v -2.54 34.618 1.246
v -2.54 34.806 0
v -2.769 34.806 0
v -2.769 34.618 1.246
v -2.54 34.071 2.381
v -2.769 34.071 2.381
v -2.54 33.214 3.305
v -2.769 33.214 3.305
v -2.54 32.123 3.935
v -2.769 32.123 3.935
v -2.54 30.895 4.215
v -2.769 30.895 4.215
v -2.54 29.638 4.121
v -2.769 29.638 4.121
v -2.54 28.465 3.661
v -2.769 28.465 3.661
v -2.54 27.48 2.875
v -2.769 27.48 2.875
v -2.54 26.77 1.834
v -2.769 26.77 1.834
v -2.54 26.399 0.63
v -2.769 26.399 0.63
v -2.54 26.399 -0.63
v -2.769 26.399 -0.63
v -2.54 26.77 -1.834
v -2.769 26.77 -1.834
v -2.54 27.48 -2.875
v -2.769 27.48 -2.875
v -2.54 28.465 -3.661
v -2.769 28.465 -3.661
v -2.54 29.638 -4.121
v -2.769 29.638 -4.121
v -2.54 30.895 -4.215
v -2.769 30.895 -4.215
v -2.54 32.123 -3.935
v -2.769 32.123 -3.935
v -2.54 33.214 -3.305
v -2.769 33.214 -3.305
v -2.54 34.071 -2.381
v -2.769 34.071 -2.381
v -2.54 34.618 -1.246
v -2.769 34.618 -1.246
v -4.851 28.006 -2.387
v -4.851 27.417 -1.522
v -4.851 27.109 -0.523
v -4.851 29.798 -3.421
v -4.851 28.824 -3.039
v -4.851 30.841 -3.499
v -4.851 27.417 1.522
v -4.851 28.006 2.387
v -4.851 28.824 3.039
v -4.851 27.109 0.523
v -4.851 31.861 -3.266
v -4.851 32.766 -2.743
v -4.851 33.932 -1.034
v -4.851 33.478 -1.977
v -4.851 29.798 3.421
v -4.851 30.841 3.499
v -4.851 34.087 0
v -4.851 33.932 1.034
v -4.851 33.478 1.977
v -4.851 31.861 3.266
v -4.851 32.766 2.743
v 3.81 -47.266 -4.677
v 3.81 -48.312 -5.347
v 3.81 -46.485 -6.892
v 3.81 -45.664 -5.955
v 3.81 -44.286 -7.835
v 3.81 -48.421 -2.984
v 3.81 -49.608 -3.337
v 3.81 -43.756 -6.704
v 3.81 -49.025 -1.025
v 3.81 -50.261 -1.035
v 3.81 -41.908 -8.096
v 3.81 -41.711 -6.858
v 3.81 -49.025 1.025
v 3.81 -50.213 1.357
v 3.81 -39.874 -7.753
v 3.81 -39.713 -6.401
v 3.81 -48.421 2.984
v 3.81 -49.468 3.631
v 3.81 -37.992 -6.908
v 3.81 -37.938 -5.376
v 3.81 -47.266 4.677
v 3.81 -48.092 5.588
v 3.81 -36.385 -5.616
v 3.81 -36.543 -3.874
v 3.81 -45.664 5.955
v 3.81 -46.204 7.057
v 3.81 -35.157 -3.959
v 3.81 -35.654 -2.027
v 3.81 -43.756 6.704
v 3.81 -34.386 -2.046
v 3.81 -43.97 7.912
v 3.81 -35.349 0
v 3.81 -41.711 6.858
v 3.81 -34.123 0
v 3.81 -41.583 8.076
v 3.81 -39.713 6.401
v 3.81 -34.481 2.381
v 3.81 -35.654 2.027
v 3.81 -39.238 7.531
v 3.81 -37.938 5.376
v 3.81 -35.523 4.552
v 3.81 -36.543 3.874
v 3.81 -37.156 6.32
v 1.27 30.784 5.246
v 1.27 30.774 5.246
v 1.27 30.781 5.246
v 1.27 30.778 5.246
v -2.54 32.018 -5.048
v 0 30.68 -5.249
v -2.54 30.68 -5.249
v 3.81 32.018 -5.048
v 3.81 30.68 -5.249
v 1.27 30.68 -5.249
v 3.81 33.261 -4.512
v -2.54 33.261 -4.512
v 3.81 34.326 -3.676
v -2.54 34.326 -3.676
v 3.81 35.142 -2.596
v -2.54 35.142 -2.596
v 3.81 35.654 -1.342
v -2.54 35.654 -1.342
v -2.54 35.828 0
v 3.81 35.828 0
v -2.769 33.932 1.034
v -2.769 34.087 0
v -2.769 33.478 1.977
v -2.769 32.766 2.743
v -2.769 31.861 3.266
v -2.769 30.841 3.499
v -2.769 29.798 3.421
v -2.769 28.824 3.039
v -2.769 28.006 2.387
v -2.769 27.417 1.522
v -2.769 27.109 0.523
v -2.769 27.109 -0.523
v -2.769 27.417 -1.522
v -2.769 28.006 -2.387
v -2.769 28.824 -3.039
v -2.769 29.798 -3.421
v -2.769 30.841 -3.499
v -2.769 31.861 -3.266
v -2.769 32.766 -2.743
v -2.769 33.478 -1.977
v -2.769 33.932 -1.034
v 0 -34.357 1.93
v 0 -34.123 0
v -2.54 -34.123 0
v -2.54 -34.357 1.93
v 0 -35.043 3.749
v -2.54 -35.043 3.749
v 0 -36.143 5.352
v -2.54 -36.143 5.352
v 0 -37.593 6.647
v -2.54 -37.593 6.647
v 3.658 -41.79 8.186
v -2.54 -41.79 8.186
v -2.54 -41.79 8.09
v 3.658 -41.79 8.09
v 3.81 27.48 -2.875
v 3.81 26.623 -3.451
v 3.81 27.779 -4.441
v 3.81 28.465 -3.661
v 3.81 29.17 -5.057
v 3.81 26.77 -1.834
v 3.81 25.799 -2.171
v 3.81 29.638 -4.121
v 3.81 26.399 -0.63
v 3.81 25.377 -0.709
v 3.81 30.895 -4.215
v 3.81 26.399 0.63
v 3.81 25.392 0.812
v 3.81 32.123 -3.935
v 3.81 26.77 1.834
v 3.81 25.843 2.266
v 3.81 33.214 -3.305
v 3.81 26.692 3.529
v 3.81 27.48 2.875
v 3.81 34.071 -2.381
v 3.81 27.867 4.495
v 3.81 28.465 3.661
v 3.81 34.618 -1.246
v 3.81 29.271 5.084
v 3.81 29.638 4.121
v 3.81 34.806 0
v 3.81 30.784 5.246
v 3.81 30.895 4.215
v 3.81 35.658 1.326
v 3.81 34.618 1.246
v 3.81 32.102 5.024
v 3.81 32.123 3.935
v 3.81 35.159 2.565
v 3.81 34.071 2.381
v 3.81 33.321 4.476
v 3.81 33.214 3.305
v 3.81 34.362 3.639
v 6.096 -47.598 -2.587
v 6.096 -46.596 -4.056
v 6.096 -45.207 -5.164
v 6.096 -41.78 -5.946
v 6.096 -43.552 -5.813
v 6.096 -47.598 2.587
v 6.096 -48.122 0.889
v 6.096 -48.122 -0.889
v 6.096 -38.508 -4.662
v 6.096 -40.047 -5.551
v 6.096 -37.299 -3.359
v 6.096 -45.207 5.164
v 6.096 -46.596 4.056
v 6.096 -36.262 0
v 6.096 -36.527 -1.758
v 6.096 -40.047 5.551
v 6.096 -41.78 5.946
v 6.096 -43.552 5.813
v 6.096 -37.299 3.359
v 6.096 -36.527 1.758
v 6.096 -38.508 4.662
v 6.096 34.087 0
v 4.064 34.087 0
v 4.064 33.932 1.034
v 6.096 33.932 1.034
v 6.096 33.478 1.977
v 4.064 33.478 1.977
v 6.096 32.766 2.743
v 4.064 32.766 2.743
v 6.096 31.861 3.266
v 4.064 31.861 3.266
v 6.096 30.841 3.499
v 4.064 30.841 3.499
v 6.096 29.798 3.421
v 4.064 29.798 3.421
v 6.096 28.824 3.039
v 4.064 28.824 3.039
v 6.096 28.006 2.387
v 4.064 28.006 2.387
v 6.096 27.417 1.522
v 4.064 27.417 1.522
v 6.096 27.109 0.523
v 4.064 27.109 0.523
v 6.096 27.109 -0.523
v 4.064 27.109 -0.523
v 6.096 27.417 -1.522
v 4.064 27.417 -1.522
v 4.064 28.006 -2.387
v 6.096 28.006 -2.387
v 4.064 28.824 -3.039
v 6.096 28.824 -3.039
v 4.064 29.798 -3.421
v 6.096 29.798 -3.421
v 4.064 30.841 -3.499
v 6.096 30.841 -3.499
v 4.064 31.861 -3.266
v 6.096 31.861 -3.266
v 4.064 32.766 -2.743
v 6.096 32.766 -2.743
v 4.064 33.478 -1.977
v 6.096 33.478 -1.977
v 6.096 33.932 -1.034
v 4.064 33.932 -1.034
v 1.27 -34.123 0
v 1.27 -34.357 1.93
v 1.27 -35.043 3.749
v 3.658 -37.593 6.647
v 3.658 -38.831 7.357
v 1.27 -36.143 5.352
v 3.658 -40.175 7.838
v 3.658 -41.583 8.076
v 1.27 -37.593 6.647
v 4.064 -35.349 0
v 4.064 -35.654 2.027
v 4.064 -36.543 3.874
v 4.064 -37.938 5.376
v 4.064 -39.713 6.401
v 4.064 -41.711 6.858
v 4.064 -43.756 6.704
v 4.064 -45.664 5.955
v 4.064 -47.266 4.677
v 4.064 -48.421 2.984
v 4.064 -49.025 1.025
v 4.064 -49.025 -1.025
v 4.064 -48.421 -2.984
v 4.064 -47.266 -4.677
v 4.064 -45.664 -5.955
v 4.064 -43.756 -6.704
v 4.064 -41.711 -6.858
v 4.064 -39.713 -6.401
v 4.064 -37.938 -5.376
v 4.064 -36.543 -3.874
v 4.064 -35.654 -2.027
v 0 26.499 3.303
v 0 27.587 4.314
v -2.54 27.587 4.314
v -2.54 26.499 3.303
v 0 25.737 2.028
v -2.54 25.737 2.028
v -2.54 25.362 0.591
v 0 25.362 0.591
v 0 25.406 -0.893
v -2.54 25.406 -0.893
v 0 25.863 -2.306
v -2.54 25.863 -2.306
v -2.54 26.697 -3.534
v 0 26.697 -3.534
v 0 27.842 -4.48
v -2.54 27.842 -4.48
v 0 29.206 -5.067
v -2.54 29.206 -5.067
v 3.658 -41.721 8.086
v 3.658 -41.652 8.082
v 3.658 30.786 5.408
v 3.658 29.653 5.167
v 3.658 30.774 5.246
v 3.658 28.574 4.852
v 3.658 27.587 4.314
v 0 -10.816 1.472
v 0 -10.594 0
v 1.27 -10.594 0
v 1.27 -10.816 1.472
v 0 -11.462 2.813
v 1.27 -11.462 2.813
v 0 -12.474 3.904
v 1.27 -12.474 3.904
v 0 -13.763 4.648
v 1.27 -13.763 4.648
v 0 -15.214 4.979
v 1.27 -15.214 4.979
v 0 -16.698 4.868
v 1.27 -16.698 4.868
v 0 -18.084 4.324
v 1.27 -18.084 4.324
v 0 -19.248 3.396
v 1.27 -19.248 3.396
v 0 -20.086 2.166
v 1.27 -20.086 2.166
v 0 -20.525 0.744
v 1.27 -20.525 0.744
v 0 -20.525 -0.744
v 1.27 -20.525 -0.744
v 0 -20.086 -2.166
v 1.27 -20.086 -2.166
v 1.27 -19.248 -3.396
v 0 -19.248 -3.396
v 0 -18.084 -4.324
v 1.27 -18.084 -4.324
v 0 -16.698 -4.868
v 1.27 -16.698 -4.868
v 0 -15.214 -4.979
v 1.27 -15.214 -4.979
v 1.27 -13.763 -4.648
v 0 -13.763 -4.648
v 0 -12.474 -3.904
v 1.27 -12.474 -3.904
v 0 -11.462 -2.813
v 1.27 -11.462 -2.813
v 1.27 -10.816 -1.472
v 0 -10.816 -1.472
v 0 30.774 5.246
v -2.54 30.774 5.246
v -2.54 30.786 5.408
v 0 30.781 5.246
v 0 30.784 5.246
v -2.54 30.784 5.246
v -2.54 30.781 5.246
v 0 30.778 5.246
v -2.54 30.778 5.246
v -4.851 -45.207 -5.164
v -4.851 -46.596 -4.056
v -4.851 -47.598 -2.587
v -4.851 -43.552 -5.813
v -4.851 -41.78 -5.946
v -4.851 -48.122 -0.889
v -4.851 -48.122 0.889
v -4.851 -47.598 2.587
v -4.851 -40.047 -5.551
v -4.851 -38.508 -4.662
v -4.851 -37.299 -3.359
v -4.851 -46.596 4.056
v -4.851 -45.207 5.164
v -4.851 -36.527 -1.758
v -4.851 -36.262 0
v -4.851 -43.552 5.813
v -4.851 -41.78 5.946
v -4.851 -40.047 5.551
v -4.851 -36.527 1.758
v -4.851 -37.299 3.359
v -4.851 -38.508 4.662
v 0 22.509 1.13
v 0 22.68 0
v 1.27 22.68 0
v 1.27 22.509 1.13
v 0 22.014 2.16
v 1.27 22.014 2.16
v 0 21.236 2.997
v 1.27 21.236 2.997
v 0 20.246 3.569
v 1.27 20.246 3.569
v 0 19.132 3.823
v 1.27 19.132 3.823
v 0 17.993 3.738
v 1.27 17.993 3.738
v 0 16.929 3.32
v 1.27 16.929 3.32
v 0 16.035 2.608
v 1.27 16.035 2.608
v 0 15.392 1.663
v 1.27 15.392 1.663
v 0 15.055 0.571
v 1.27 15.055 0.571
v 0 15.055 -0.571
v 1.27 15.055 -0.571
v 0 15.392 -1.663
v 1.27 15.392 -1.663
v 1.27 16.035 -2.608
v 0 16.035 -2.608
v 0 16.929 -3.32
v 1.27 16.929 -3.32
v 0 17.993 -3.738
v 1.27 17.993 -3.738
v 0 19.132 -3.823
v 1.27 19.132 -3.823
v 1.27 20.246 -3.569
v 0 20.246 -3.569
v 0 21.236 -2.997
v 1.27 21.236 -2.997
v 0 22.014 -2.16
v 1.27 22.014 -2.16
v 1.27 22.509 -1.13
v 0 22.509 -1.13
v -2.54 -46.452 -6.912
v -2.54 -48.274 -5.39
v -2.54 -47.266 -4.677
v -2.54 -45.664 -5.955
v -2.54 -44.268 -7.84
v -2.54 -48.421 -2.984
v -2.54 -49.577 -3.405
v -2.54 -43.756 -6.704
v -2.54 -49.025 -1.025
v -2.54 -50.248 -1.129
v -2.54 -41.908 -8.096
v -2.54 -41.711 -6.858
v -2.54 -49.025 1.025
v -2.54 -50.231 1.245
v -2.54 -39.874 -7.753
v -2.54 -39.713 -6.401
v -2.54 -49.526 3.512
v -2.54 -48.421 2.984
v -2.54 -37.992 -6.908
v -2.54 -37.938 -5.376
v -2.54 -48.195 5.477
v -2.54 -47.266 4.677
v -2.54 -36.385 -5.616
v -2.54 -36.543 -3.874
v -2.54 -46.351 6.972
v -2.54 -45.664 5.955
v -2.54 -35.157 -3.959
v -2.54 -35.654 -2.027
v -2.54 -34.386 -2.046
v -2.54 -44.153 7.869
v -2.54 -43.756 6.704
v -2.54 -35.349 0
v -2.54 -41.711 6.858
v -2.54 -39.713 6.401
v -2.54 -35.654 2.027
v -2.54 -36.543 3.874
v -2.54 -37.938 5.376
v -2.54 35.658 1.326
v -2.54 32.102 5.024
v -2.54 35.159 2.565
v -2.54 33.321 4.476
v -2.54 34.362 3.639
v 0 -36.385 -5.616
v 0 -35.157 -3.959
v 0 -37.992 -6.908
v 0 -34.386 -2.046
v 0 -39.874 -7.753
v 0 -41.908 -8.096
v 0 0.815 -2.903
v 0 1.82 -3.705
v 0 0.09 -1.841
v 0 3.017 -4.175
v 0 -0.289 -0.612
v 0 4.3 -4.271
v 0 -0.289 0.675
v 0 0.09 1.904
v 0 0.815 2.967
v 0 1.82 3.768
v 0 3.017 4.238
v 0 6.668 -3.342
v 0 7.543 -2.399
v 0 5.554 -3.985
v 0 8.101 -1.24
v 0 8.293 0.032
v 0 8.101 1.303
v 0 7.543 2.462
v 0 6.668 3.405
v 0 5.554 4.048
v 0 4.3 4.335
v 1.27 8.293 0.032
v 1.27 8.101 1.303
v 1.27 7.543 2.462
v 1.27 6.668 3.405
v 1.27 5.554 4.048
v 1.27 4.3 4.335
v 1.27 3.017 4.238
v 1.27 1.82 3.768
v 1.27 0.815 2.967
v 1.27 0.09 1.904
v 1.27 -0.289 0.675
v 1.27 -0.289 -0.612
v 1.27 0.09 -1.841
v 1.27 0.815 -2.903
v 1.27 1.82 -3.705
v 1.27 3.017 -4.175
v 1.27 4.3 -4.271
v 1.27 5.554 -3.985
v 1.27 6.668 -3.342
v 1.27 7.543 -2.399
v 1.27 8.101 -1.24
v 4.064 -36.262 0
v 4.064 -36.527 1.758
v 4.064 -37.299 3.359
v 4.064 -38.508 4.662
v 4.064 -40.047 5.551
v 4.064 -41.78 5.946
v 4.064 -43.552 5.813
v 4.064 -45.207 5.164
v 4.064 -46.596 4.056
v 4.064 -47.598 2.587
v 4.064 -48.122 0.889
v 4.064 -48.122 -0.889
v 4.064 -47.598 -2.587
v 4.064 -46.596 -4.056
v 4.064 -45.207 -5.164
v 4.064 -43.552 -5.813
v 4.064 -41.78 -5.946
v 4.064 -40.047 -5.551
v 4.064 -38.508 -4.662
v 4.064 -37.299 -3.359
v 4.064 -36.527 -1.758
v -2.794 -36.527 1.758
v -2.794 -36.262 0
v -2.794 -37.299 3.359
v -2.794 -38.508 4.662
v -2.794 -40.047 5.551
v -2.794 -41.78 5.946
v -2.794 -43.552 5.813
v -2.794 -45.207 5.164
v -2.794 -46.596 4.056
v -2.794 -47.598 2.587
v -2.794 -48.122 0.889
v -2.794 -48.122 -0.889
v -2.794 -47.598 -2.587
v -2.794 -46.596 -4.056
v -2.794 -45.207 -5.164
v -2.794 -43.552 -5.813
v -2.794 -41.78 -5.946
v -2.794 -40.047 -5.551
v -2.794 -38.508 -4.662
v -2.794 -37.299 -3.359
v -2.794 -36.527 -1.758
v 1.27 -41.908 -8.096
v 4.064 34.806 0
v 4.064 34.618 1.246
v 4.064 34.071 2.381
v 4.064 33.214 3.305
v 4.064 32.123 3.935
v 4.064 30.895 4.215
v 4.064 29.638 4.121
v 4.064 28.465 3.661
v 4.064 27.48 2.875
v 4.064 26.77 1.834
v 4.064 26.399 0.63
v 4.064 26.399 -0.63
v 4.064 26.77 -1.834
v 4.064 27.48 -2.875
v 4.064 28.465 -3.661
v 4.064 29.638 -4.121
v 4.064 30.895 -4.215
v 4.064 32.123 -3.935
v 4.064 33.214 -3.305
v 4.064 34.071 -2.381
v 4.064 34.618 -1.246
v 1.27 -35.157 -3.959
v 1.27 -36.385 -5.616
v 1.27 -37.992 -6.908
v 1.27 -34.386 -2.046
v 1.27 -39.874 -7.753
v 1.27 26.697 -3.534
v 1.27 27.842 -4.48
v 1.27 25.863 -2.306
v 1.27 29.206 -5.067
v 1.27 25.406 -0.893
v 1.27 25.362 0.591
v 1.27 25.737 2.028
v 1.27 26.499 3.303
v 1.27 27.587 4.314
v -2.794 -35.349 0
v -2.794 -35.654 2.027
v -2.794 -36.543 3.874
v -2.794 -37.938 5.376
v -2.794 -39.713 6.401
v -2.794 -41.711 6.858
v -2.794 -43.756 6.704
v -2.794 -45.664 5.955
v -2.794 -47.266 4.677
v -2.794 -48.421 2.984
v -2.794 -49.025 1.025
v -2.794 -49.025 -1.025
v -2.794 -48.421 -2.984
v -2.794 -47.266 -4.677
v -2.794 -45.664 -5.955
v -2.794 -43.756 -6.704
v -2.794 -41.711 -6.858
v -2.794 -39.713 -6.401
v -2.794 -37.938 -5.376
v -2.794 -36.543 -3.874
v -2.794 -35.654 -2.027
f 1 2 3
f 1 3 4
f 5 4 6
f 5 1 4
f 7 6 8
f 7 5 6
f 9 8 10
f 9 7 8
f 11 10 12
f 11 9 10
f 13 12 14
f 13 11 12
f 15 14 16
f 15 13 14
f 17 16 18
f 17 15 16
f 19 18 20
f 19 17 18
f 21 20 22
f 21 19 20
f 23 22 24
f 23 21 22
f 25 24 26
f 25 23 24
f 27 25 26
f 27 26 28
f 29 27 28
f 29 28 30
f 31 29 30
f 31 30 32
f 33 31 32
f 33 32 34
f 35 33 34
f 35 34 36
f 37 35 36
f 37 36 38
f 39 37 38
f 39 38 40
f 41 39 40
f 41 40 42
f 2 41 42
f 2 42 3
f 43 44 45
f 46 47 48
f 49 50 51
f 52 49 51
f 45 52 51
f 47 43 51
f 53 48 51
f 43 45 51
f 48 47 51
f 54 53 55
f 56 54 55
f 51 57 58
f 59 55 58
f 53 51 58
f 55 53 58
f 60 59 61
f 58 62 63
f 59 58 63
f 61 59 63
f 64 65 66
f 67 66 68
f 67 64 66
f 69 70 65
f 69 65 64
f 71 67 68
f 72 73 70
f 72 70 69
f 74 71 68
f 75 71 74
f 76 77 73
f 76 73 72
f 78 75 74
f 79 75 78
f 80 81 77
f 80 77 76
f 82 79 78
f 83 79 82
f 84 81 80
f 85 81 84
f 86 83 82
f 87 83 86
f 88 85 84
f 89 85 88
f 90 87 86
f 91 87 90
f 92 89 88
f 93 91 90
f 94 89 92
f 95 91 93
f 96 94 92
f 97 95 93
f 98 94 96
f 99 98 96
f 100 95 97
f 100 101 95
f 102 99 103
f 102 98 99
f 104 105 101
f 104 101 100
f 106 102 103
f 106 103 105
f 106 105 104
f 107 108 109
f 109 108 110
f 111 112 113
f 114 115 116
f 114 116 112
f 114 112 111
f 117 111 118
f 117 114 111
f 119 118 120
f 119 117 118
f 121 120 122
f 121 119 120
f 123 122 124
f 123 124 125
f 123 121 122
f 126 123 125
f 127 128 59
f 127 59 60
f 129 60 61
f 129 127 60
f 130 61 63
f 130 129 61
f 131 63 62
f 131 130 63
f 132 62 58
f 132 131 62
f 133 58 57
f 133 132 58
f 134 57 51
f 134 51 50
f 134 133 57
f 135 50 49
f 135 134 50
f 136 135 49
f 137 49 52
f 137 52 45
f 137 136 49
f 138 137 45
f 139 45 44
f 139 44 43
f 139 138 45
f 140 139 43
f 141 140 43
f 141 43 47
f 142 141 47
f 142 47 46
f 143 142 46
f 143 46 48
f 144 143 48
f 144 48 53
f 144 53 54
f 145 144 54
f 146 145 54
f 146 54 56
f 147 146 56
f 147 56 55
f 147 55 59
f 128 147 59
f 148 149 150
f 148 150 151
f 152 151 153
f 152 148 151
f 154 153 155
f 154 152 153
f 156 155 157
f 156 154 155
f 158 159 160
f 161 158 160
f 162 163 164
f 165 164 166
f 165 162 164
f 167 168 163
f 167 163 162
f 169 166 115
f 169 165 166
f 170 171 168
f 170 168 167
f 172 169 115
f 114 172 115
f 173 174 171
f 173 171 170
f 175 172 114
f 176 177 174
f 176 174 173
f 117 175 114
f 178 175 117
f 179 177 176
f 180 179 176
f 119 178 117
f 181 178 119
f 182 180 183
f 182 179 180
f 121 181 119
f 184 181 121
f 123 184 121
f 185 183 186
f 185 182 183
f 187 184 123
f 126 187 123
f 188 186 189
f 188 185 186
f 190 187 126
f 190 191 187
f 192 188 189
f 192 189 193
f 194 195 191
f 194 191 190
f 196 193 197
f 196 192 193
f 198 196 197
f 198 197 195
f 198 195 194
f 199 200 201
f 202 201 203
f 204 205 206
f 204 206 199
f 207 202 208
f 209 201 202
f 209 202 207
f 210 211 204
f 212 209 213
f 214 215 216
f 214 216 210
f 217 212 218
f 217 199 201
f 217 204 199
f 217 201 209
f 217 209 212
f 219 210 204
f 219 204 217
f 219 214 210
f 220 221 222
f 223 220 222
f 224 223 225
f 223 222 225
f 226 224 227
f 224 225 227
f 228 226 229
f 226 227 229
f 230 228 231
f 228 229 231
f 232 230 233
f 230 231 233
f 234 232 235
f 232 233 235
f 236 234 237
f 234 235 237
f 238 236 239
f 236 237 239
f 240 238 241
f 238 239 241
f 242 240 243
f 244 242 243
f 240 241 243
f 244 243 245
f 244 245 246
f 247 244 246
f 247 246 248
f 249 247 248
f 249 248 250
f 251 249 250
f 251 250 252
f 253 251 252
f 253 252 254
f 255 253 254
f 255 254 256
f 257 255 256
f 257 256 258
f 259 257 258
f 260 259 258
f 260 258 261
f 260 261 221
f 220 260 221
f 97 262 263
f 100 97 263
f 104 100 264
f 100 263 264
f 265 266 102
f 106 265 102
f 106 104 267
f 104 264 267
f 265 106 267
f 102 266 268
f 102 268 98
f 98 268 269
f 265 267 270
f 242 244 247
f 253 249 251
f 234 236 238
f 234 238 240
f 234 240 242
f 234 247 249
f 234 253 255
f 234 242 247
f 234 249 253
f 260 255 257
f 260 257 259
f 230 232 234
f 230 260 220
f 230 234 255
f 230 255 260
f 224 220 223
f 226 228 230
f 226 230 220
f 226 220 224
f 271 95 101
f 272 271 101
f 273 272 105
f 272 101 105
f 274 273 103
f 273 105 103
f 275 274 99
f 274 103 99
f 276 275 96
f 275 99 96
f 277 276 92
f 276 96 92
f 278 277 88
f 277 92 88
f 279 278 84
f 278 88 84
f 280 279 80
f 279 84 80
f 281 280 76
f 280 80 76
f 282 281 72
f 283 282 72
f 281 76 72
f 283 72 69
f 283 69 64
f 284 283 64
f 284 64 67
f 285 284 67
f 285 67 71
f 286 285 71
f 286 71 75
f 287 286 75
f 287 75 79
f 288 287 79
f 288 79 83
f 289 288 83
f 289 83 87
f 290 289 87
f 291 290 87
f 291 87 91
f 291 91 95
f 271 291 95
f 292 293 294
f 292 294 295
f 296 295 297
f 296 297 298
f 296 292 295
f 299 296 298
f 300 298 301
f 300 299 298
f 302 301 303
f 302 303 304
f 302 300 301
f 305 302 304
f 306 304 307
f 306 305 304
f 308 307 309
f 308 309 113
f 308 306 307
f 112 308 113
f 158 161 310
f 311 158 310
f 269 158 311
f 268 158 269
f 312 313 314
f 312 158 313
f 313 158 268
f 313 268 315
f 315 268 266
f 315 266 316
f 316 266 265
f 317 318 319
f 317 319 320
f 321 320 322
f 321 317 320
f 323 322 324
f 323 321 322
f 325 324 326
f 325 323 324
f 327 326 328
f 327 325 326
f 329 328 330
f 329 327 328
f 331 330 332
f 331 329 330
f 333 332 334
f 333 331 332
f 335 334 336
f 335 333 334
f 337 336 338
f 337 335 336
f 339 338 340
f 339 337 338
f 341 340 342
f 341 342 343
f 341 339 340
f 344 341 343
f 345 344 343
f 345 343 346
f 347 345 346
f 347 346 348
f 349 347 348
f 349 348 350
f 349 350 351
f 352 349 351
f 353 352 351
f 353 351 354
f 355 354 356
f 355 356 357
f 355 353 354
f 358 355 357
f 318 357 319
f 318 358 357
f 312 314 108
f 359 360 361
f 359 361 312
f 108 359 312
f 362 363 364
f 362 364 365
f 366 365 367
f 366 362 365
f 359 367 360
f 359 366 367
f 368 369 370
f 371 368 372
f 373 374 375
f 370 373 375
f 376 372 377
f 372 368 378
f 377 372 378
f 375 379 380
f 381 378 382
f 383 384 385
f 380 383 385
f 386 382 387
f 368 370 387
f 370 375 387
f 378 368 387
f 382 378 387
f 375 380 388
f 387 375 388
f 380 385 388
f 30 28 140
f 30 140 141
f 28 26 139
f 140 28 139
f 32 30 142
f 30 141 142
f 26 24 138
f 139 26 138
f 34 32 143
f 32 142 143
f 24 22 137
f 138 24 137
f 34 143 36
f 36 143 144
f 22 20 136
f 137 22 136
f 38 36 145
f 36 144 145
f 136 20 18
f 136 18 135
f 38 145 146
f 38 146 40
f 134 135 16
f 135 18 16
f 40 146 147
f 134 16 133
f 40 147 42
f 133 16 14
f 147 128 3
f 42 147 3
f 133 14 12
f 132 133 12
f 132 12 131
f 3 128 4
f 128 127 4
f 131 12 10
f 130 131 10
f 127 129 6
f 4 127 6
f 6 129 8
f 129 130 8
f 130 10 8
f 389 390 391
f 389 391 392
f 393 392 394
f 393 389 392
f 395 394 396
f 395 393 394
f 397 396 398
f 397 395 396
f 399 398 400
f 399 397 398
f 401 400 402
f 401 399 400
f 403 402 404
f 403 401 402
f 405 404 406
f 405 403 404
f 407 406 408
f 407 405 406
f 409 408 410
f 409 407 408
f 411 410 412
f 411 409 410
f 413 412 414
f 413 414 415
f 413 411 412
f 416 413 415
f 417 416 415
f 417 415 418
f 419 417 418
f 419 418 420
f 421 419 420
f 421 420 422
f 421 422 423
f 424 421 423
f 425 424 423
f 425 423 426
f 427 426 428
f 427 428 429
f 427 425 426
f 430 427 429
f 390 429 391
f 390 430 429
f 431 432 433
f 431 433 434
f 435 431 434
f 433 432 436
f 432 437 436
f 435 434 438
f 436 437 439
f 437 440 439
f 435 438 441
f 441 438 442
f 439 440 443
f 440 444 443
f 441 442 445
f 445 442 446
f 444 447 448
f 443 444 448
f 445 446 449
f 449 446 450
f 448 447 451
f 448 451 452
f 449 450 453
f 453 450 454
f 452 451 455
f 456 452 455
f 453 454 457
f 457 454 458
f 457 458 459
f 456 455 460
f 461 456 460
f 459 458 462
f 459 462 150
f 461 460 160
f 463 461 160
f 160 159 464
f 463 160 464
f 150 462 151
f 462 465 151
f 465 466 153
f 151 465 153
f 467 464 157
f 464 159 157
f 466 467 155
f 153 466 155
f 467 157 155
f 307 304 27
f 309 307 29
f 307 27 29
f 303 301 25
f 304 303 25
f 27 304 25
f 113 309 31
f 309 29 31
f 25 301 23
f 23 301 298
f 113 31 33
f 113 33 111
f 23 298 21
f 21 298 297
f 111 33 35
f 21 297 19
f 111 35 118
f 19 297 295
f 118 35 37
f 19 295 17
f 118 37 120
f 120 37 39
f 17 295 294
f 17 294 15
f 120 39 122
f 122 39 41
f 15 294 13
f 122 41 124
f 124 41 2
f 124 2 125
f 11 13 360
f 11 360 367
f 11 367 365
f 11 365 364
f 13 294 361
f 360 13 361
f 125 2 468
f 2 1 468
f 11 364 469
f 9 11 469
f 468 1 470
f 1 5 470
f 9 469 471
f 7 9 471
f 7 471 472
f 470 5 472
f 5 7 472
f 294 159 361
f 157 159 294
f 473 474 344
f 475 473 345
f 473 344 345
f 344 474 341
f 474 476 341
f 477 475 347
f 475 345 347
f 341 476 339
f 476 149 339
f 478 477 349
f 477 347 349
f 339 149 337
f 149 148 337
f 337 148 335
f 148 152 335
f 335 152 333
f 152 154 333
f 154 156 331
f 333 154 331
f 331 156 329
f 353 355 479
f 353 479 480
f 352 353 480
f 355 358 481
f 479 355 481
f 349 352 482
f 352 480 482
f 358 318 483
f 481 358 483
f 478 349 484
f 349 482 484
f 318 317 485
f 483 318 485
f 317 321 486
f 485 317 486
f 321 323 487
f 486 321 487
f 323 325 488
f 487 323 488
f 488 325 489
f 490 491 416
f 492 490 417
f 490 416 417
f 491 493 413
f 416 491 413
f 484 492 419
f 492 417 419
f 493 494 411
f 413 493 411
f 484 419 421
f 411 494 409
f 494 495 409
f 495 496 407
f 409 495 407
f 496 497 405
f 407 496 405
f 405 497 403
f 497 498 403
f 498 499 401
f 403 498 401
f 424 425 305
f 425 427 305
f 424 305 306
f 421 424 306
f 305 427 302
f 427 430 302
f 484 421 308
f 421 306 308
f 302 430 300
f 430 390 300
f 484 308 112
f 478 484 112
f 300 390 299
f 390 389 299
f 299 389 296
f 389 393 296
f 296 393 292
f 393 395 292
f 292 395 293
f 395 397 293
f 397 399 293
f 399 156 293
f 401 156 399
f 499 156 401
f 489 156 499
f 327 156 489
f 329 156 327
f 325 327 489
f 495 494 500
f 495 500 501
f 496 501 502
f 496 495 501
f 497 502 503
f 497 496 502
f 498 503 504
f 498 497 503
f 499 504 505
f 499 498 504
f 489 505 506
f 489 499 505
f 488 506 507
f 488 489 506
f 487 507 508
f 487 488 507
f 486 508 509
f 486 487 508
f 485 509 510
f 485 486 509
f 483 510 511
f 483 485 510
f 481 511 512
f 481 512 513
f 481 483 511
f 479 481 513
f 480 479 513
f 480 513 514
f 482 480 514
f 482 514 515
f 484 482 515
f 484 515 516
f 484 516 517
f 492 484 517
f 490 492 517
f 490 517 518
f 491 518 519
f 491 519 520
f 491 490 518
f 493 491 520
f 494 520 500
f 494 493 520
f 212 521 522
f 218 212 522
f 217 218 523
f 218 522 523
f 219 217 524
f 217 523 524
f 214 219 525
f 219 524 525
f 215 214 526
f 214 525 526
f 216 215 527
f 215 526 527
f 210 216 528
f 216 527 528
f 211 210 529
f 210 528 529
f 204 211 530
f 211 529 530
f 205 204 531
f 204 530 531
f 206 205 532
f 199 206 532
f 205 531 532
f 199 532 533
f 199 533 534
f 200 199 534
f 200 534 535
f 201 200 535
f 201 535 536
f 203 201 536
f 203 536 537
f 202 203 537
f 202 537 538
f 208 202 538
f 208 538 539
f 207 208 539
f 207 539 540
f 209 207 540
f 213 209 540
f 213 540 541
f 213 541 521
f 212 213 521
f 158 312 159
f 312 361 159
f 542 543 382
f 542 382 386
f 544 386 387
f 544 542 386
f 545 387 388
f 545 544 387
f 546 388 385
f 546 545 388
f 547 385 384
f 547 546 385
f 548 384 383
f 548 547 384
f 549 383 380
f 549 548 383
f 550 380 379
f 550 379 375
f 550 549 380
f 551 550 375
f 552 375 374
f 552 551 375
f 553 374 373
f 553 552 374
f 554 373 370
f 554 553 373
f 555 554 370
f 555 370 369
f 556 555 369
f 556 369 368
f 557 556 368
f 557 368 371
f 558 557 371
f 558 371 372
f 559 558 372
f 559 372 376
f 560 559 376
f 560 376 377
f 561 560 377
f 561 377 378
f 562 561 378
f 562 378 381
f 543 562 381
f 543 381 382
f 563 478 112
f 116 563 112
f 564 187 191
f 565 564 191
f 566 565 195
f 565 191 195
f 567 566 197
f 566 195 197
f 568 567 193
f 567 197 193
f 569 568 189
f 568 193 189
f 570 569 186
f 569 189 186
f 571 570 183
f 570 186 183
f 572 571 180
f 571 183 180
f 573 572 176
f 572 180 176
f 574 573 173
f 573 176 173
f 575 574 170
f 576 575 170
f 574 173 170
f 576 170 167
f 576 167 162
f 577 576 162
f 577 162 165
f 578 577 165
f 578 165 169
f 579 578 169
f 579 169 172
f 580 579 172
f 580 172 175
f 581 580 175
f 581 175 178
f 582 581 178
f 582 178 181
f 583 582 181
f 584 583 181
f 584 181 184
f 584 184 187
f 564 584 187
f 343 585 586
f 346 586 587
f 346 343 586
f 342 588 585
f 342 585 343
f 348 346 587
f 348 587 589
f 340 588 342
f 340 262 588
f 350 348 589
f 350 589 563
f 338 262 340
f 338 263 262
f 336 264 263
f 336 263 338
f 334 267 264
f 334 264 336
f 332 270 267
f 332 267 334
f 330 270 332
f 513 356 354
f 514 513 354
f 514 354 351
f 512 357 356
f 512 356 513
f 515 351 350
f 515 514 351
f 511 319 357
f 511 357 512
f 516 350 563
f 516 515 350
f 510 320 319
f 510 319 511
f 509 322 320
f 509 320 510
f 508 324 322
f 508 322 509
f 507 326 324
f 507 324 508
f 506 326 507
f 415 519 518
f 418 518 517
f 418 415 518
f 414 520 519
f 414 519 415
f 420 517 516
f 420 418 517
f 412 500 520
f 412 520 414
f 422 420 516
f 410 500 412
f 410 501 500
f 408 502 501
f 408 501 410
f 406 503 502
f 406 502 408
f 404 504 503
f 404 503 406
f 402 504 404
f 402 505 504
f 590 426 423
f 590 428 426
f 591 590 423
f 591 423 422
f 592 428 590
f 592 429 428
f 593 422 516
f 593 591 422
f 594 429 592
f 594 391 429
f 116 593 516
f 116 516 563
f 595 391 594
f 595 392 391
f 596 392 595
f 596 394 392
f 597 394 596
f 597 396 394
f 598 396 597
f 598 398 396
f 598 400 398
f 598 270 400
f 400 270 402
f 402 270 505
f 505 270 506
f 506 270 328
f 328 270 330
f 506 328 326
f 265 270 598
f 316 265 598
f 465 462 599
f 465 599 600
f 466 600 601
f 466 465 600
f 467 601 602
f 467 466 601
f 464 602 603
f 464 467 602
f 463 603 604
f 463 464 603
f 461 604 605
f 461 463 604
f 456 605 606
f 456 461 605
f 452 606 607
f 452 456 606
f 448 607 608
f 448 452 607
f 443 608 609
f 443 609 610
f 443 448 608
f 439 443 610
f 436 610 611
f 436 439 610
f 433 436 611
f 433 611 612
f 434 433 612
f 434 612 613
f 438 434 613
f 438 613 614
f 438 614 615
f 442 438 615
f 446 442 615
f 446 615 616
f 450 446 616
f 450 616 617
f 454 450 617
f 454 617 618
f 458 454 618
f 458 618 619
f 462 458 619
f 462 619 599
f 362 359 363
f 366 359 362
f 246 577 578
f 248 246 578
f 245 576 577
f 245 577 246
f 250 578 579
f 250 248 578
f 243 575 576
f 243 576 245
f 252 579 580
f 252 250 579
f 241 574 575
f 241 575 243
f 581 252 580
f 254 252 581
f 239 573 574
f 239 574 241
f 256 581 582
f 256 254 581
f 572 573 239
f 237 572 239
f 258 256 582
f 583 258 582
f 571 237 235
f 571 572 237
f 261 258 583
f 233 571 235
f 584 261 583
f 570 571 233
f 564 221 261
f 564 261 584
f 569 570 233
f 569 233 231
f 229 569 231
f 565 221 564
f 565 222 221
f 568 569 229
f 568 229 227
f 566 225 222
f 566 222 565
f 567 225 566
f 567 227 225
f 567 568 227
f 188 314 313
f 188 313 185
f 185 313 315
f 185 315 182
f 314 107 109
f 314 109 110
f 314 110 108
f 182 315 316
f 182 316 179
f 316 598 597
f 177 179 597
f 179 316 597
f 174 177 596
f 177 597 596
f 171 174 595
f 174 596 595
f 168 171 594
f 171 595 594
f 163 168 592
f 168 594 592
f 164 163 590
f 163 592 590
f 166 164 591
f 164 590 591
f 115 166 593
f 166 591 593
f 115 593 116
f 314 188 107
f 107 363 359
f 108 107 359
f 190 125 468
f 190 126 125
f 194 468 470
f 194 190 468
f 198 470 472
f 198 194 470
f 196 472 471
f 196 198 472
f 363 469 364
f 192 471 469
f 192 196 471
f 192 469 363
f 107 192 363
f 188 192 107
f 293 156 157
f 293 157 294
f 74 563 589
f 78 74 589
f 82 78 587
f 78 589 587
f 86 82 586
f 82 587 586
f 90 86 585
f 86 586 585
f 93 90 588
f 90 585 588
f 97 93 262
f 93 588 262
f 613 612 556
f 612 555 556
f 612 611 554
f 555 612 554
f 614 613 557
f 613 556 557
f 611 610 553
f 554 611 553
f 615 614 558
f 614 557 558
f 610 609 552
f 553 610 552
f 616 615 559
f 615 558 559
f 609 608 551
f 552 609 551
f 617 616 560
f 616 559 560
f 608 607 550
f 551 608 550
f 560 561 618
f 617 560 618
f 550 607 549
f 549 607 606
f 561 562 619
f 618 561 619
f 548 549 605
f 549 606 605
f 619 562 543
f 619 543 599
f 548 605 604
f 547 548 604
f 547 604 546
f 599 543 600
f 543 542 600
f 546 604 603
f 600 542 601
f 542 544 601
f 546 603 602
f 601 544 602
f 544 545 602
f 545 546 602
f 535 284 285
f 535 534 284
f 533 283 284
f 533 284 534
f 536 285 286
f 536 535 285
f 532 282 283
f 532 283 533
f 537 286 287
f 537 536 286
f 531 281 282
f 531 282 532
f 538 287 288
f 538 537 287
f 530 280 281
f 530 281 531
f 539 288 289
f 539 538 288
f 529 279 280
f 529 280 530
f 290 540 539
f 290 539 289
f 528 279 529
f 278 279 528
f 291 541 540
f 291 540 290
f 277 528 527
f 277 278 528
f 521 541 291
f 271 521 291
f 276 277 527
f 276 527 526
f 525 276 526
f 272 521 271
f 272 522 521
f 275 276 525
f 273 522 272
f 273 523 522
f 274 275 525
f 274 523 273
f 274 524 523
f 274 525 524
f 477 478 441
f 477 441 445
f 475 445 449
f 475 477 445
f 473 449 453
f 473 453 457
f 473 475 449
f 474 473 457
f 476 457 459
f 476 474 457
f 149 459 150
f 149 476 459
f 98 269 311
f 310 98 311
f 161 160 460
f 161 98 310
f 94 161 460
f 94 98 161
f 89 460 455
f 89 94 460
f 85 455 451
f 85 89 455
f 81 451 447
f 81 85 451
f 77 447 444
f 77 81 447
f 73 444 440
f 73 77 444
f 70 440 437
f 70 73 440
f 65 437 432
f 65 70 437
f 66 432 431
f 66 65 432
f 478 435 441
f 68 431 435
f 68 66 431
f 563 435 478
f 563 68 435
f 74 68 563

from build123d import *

# Parameters (mm, degrees)
F0_R      = 4.993118
F0_R_2    = 4.314977
F0_R_3    = 3.833909
F1_DEPTH  = 1.27
F0_R_4    = 6.876747
F0_R_5    = 4.227285
F2_DEPTH  = 3.81
F3_DEPTH  = 2.54
F5_DEPTH  = 2.54
F6_DEPTH  = 2.5146
F0_R_6    = 5.96286
F0_R_7    = 3.508795
F7_DEPTH  = 1.778
F8_DEPTH  = 3.6576
F9_DEPTH  = 4.064
F10_DEPTH = 2.794
F11_DEPTH = 2.7686
F12_DEPTH = 6.096
F13_DEPTH = 4.8514


with BuildPart() as f1:
    # F0 (on Right) → F1 (new body)
    with BuildSketch(Plane.YZ):
        with BuildLine():
            ThreePointArc((30.679518, -5.2486), (25.329293, 0.052162), (30.783797, 5.245558))
            Line((30.783797, 5.245558), (-41.582841, 8.076357))
            ThreePointArc((-41.582841, 8.076357), (-36.273612, 5.497048), (-34.123445, 0))
            ThreePointArc((-34.123445, 0), (-36.385243, -5.615502), (-41.907786, -8.095646))
            Line((-41.907786, -8.095646), (30.679518, -5.2486))
        make_face()
        with Locations((-15.587313, 0)):
            Circle(F0_R, mode=Mode.SUBTRACT)
        with Locations((3.977629, 0.031597)):
            Circle(F0_R_2, mode=Mode.SUBTRACT)
        with Locations((18.845779, 0)):
            Circle(F0_R_3, mode=Mode.SUBTRACT)
    extrude(amount=F1_DEPTH)

    # F0 (on Right) → F2 (join)
    with BuildSketch(Plane.YZ):
        with BuildLine():
            ThreePointArc((-34.123445, 0), (-36.273612, 5.497048), (-41.582841, 8.076357))
            ThreePointArc((-41.582841, 8.076357), (-50.325552, 0.162758), (-41.907786, -8.095646))
            ThreePointArc((-41.907786, -8.095646), (-36.385243, -5.615502), (-34.123445, 0))
        make_face()
        with Locations((-42.225316, 0)):
            Circle(F0_R_4, mode=Mode.SUBTRACT)
        with BuildLine():
            ThreePointArc((30.679518, -5.2486), (34.326119, -3.676155), (35.828174, 0))
            ThreePointArc((35.828174, 0), (34.362462, 3.638737), (30.783797, 5.245558))
            ThreePointArc((30.783797, 5.245558), (25.329293, 0.052162), (30.679518, -5.2486))
        make_face()
        with Locations((30.578604, 0)):
            Circle(F0_R_5, mode=Mode.SUBTRACT)
    extrude(amount=F2_DEPTH)

    # F0 (on Right) → F3 (join)
    with BuildSketch(Plane.YZ):
        with BuildLine():
            ThreePointArc((-34.123445, 0), (-36.273612, 5.497048), (-41.582841, 8.076357))
            ThreePointArc((-41.582841, 8.076357), (-50.325552, 0.162758), (-41.907786, -8.095646))
            ThreePointArc((-41.907786, -8.095646), (-36.385243, -5.615502), (-34.123445, 0))
        make_face()
        with Locations((-42.225316, 0)):
            Circle(F0_R_4, mode=Mode.SUBTRACT)
        with BuildLine():
            ThreePointArc((30.679518, -5.2486), (34.326119, -3.676155), (35.828174, 0))
            ThreePointArc((35.828174, 0), (34.362462, 3.638737), (30.783797, 5.245558))
            ThreePointArc((30.783797, 5.245558), (25.329293, 0.052162), (30.679518, -5.2486))
        make_face()
        with Locations((30.578604, 0)):
            Circle(F0_R_5, mode=Mode.SUBTRACT)
    extrude(amount=-F3_DEPTH)

    # F4 (on Right) → F5 (join)
    with BuildSketch(Plane.YZ):
        Polygon((30.701259, 4.202033), (30.785728, 5.408032), (-41.789994, 8.186051), (-41.789994, 6.797041), align=None)
    extrude(amount=-F5_DEPTH)

    # F4 (on Right) → F6 (join)
    with BuildSketch(Plane.YZ):
        Polygon((30.701259, 4.202033), (30.785728, 5.408032), (-41.789994, 8.186051), (-41.789994, 6.797041), align=None)
    extrude(amount=-F6_DEPTH)

    # F0 (on Right) → F7 (join)
    with BuildSketch(Plane.YZ):
        with Locations((-42.225316, 0)):
            Circle(F0_R_4)
        with Locations((-42.225316, 0)):
            Circle(F0_R_6, mode=Mode.SUBTRACT)
        with Locations((30.578604, 0)):
            Circle(F0_R_5)
        with Locations((30.578604, 0)):
            Circle(F0_R_7, mode=Mode.SUBTRACT)
    extrude(amount=F7_DEPTH)

    # F4 (on Right) → F8 (join)
    with BuildSketch(Plane.YZ):
        Polygon((30.701259, 4.202033), (30.785728, 5.408032), (-41.789994, 8.186051), (-41.789994, 6.797041), align=None)
    extrude(amount=F8_DEPTH)

    # F0 (on Right) → F9 (join)
    with BuildSketch(Plane.YZ):
        with Locations((30.578604, 0)):
            Circle(F0_R_5)
        with Locations((30.578604, 0)):
            Circle(F0_R_7, mode=Mode.SUBTRACT)
        with Locations((-42.225316, 0)):
            Circle(F0_R_4)
        with Locations((-42.225316, 0)):
            Circle(F0_R_6, mode=Mode.SUBTRACT)
    extrude(amount=F9_DEPTH)

    # F0 (on Right) → F10 (join)
    with BuildSketch(Plane.YZ):
        with Locations((-42.225316, 0)):
            Circle(F0_R_4)
        with Locations((-42.225316, 0)):
            Circle(F0_R_6, mode=Mode.SUBTRACT)
    extrude(amount=-F10_DEPTH)

    # F0 (on Right) → F11 (join)
    with BuildSketch(Plane.YZ):
        with Locations((30.578604, 0)):
            Circle(F0_R_5)
        with Locations((30.578604, 0)):
            Circle(F0_R_7, mode=Mode.SUBTRACT)
    extrude(amount=-F11_DEPTH)

    # F0 (on Right) → F12 (join)
    with BuildSketch(Plane.YZ):
        with Locations((-42.225316, 0)):
            Circle(F0_R_6)
        with Locations((30.578604, 0)):
            Circle(F0_R_7)
    extrude(amount=F12_DEPTH)

    # F0 (on Right) → F13 (join)
    with BuildSketch(Plane.YZ):
        with Locations((30.578604, 0)):
            Circle(F0_R_7)
        with Locations((-42.225316, 0)):
            Circle(F0_R_6)
    extrude(amount=-F13_DEPTH)


solid = f1.part
